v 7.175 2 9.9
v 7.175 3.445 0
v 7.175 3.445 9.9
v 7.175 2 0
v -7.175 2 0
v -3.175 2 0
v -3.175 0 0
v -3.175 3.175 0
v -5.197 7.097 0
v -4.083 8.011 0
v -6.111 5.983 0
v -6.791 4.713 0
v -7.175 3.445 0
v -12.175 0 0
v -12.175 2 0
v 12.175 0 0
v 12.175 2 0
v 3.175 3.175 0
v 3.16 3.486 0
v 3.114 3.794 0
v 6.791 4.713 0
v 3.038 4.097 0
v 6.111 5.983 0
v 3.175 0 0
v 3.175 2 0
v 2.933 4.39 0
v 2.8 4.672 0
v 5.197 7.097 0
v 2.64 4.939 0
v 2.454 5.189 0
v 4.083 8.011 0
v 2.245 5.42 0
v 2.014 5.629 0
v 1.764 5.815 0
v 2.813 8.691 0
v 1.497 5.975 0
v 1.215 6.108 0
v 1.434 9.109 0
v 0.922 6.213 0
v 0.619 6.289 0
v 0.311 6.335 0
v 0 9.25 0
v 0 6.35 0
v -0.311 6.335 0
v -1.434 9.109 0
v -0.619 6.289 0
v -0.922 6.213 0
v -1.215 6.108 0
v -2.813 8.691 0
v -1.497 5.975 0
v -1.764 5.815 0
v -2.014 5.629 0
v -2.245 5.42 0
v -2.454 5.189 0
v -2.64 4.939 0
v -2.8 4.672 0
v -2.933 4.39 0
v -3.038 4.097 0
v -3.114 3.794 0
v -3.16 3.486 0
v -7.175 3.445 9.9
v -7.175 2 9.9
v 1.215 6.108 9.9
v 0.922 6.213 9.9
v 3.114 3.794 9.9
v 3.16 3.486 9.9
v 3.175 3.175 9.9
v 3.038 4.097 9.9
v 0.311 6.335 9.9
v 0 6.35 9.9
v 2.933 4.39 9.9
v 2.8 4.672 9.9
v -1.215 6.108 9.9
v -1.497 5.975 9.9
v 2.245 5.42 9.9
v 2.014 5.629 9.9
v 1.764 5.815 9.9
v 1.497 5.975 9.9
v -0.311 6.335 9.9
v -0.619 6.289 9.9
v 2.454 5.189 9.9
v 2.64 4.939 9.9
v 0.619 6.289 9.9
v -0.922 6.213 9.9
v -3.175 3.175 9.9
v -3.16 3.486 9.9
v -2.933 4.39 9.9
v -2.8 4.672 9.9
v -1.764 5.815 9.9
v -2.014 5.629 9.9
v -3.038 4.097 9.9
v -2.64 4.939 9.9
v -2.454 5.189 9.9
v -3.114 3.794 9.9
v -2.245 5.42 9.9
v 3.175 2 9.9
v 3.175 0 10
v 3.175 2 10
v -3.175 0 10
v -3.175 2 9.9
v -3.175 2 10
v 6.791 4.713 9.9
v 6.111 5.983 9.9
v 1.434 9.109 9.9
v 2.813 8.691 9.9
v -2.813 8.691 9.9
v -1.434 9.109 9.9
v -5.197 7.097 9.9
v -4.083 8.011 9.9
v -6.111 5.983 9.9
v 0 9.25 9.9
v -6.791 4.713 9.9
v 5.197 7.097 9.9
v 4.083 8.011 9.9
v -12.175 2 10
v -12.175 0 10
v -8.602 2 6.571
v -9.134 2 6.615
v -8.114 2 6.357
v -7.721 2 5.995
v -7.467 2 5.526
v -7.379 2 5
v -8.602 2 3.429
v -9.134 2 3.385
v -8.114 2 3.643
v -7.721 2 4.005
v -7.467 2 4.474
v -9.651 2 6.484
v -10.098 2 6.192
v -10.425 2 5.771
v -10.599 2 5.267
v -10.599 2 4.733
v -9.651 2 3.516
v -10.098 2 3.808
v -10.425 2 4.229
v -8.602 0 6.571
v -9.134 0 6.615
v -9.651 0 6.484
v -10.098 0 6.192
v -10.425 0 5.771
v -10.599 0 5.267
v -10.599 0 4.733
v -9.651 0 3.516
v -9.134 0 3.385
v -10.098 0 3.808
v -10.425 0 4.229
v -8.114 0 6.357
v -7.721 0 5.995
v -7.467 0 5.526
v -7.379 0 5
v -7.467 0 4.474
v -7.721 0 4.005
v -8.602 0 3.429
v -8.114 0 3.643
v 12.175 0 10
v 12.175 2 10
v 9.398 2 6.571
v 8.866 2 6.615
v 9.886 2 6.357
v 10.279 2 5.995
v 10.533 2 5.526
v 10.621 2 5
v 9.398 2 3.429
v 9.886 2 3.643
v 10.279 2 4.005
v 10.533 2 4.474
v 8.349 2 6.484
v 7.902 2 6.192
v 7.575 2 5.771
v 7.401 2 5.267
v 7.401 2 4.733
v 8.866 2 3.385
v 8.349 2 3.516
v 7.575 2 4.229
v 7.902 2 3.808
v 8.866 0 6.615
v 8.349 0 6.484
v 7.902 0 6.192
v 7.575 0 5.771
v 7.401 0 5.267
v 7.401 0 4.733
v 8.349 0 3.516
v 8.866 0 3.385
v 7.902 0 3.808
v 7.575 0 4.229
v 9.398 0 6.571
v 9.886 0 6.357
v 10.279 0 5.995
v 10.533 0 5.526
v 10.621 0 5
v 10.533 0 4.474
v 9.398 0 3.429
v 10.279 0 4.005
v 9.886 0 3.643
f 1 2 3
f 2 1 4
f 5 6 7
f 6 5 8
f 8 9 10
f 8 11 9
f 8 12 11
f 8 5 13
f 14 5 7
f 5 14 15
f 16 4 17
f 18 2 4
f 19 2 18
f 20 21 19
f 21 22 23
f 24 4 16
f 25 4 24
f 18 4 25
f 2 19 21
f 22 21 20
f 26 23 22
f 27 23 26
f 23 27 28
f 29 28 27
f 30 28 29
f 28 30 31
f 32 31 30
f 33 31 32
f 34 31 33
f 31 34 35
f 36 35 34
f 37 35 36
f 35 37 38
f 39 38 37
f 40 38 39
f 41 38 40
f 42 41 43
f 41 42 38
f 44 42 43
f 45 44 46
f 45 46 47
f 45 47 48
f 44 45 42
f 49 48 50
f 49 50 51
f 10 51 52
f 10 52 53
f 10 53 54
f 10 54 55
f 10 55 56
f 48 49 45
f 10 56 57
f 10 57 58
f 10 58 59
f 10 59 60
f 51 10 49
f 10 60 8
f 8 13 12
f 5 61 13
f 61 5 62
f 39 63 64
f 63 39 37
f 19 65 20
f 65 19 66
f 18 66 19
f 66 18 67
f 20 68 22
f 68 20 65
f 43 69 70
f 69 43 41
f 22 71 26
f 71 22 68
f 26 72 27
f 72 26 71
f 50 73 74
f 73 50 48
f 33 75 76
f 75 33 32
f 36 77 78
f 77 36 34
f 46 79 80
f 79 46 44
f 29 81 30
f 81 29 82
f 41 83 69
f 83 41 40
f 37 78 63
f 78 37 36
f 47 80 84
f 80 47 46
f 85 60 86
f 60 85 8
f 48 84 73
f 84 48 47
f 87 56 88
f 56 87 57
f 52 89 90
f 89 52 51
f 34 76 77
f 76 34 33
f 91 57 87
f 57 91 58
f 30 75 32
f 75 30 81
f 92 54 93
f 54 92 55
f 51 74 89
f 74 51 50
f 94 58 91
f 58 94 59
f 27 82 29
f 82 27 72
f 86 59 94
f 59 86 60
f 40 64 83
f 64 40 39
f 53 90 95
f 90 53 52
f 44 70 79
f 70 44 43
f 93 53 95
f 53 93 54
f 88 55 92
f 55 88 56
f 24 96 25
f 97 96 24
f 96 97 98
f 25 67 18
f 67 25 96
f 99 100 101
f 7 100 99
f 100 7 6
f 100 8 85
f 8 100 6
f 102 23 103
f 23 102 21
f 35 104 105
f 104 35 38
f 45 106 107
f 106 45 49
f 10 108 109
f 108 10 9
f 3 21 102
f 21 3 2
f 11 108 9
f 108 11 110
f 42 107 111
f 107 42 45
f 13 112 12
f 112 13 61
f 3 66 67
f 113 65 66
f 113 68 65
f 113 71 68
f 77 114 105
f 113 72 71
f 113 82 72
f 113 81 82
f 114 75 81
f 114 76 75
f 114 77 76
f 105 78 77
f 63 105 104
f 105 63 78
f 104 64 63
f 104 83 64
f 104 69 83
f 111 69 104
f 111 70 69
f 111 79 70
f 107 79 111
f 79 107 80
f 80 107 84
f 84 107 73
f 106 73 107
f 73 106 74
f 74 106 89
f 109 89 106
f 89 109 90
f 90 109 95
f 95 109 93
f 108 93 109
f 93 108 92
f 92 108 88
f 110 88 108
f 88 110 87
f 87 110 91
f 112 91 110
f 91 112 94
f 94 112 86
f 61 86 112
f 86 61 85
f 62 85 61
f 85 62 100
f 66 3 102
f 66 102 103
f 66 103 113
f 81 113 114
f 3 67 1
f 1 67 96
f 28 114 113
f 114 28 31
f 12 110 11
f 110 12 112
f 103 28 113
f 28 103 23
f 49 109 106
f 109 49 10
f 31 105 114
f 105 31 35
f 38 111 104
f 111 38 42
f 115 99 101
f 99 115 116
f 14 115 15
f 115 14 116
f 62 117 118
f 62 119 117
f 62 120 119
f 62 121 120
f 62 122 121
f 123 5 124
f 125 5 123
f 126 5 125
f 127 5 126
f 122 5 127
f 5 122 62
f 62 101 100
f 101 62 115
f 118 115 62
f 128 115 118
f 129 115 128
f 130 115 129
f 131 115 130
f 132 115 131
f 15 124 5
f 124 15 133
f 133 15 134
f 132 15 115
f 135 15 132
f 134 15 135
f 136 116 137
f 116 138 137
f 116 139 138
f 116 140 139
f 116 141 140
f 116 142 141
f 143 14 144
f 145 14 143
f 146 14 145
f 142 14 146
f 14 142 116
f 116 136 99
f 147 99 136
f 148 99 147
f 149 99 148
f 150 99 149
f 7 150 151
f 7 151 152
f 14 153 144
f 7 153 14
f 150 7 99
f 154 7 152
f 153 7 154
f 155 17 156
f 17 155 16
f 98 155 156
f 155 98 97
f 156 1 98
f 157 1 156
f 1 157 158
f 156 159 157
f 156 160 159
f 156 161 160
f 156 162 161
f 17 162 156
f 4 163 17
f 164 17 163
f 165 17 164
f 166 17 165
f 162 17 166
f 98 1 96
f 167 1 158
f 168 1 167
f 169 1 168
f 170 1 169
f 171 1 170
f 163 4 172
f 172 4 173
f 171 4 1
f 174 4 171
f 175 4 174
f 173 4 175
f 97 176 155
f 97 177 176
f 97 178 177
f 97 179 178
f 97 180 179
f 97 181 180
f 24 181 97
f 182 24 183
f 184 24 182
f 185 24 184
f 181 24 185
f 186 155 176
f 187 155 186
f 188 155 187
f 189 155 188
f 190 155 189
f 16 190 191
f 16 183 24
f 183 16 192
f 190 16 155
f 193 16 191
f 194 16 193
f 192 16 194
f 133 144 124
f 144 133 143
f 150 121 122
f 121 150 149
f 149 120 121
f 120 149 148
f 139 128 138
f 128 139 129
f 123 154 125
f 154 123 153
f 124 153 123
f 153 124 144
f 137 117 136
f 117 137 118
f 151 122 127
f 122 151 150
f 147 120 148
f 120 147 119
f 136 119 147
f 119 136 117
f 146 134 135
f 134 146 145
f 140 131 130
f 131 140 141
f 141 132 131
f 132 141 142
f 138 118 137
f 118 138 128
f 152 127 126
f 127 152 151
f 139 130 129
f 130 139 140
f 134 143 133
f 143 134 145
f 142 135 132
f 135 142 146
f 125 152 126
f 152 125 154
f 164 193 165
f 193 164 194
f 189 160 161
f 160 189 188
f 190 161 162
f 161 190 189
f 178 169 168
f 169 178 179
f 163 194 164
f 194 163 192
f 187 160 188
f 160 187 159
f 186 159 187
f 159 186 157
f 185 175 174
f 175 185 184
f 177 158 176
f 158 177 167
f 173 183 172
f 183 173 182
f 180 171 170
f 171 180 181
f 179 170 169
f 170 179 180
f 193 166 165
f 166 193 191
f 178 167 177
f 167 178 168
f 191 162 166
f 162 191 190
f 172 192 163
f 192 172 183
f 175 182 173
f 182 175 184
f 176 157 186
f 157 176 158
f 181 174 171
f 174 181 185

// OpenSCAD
// file: myLibs.scad
pi= 3.14159265359;

module hole(diam, height, clearance= 0.1)
{
        fn= round(diam * pi / 0.5);
        cylinder(h= height, r=diam / 2 / cos(180 / fn) + clearance, $fn=fn);
}

module nutTrap(ffd, faces=6, height=1)
{
	cylinder(h= height, r=ffd / cos(180 / faces) / 2 + 0.05, $fn=faces);
}

// A slot which has rounded ends, but total length is l
module slot(d= 4, l= 8, ht= 1, clearance=0.1) {
	fn= round(d * pi / 0.5);
	rd= d / 2 / cos(180 / fn) + clearance;
	d1= rd*2;
	union() {
		translate([0,0,ht/2]) cube([l-d1, d1, ht], center=true);
		translate([-(l-d1)/2, 0, ht/2]) cylinder(h=ht, r=rd, $fn=fn, center=true); 
		translate([(l-d1)/2, 0, ht/2]) cylinder(h=ht, r=rd, $fn=fn, center=true); 
	}
	
}

/**
 * Standard right-angled triangle
 *
 * @param number o_len Lenght of the opposite side
 * @param number a_len Lenght of the adjacent side
 * @param number depth How wide/deep the triangle is in the 3rd dimension
 * @todo a better way ?
 */
module triangle(o_len, a_len, depth)
{
    linear_extrude(height=depth)
    {
        polygon(points=[[0,0],[a_len,0],[0,o_len]], paths=[[0,1,2]]);
    }
}
// main file
use <myLibs.scad>

mm= 25.4;
dia= 0.25 * mm;
thick= 2;
len= 10;
flangel= 18;
flanget= 3;
flangew= dia/2+8;

//tube();
base_bracket();
//half_cyl(d=dia+thick+4, h= len);

module half_cyl(d, h) {
	$fn= 32;
	difference() {
		translate([0,0,-0.1]) cylinder(r=d/2, h= h);
		translate([-d/2,-d,-0.2]) cube([d,d,h+0.4]);		
	}	
}

module tube() {
	x= dia+thick+6;
	difference() {
		translate([-x/2,0,0]) cube([x,flangew,len]);
		translate([0,dia/2,-0.1]) cylinder(r=dia/2, h= len+0.2,$fn=64);
		translate([0,0,len/2]) cube([dia,dia,len+0.2], center=true);
	}
}

module base_bracket() {
	difference() {
		union() {
			intersection() {
				tube();
				translate([0,thick-0.1,0]) half_cyl(d=dia*2+thick,h=len);
			}
	
			translate([-flangel/2-dia/2,0,0]) cube([flangel/2,thick,len]);
			translate([dia/2,0,0]) cube([flangel/2,thick,len]);
		}
		// holes
		#translate([-flangel/2,6/2,len/2]) rotate([90,0,0]) hole(3, 6);
		#translate([flangel/2,6/2,len/2]) rotate([90,0,0]) hole(3, 6);
	}
}
